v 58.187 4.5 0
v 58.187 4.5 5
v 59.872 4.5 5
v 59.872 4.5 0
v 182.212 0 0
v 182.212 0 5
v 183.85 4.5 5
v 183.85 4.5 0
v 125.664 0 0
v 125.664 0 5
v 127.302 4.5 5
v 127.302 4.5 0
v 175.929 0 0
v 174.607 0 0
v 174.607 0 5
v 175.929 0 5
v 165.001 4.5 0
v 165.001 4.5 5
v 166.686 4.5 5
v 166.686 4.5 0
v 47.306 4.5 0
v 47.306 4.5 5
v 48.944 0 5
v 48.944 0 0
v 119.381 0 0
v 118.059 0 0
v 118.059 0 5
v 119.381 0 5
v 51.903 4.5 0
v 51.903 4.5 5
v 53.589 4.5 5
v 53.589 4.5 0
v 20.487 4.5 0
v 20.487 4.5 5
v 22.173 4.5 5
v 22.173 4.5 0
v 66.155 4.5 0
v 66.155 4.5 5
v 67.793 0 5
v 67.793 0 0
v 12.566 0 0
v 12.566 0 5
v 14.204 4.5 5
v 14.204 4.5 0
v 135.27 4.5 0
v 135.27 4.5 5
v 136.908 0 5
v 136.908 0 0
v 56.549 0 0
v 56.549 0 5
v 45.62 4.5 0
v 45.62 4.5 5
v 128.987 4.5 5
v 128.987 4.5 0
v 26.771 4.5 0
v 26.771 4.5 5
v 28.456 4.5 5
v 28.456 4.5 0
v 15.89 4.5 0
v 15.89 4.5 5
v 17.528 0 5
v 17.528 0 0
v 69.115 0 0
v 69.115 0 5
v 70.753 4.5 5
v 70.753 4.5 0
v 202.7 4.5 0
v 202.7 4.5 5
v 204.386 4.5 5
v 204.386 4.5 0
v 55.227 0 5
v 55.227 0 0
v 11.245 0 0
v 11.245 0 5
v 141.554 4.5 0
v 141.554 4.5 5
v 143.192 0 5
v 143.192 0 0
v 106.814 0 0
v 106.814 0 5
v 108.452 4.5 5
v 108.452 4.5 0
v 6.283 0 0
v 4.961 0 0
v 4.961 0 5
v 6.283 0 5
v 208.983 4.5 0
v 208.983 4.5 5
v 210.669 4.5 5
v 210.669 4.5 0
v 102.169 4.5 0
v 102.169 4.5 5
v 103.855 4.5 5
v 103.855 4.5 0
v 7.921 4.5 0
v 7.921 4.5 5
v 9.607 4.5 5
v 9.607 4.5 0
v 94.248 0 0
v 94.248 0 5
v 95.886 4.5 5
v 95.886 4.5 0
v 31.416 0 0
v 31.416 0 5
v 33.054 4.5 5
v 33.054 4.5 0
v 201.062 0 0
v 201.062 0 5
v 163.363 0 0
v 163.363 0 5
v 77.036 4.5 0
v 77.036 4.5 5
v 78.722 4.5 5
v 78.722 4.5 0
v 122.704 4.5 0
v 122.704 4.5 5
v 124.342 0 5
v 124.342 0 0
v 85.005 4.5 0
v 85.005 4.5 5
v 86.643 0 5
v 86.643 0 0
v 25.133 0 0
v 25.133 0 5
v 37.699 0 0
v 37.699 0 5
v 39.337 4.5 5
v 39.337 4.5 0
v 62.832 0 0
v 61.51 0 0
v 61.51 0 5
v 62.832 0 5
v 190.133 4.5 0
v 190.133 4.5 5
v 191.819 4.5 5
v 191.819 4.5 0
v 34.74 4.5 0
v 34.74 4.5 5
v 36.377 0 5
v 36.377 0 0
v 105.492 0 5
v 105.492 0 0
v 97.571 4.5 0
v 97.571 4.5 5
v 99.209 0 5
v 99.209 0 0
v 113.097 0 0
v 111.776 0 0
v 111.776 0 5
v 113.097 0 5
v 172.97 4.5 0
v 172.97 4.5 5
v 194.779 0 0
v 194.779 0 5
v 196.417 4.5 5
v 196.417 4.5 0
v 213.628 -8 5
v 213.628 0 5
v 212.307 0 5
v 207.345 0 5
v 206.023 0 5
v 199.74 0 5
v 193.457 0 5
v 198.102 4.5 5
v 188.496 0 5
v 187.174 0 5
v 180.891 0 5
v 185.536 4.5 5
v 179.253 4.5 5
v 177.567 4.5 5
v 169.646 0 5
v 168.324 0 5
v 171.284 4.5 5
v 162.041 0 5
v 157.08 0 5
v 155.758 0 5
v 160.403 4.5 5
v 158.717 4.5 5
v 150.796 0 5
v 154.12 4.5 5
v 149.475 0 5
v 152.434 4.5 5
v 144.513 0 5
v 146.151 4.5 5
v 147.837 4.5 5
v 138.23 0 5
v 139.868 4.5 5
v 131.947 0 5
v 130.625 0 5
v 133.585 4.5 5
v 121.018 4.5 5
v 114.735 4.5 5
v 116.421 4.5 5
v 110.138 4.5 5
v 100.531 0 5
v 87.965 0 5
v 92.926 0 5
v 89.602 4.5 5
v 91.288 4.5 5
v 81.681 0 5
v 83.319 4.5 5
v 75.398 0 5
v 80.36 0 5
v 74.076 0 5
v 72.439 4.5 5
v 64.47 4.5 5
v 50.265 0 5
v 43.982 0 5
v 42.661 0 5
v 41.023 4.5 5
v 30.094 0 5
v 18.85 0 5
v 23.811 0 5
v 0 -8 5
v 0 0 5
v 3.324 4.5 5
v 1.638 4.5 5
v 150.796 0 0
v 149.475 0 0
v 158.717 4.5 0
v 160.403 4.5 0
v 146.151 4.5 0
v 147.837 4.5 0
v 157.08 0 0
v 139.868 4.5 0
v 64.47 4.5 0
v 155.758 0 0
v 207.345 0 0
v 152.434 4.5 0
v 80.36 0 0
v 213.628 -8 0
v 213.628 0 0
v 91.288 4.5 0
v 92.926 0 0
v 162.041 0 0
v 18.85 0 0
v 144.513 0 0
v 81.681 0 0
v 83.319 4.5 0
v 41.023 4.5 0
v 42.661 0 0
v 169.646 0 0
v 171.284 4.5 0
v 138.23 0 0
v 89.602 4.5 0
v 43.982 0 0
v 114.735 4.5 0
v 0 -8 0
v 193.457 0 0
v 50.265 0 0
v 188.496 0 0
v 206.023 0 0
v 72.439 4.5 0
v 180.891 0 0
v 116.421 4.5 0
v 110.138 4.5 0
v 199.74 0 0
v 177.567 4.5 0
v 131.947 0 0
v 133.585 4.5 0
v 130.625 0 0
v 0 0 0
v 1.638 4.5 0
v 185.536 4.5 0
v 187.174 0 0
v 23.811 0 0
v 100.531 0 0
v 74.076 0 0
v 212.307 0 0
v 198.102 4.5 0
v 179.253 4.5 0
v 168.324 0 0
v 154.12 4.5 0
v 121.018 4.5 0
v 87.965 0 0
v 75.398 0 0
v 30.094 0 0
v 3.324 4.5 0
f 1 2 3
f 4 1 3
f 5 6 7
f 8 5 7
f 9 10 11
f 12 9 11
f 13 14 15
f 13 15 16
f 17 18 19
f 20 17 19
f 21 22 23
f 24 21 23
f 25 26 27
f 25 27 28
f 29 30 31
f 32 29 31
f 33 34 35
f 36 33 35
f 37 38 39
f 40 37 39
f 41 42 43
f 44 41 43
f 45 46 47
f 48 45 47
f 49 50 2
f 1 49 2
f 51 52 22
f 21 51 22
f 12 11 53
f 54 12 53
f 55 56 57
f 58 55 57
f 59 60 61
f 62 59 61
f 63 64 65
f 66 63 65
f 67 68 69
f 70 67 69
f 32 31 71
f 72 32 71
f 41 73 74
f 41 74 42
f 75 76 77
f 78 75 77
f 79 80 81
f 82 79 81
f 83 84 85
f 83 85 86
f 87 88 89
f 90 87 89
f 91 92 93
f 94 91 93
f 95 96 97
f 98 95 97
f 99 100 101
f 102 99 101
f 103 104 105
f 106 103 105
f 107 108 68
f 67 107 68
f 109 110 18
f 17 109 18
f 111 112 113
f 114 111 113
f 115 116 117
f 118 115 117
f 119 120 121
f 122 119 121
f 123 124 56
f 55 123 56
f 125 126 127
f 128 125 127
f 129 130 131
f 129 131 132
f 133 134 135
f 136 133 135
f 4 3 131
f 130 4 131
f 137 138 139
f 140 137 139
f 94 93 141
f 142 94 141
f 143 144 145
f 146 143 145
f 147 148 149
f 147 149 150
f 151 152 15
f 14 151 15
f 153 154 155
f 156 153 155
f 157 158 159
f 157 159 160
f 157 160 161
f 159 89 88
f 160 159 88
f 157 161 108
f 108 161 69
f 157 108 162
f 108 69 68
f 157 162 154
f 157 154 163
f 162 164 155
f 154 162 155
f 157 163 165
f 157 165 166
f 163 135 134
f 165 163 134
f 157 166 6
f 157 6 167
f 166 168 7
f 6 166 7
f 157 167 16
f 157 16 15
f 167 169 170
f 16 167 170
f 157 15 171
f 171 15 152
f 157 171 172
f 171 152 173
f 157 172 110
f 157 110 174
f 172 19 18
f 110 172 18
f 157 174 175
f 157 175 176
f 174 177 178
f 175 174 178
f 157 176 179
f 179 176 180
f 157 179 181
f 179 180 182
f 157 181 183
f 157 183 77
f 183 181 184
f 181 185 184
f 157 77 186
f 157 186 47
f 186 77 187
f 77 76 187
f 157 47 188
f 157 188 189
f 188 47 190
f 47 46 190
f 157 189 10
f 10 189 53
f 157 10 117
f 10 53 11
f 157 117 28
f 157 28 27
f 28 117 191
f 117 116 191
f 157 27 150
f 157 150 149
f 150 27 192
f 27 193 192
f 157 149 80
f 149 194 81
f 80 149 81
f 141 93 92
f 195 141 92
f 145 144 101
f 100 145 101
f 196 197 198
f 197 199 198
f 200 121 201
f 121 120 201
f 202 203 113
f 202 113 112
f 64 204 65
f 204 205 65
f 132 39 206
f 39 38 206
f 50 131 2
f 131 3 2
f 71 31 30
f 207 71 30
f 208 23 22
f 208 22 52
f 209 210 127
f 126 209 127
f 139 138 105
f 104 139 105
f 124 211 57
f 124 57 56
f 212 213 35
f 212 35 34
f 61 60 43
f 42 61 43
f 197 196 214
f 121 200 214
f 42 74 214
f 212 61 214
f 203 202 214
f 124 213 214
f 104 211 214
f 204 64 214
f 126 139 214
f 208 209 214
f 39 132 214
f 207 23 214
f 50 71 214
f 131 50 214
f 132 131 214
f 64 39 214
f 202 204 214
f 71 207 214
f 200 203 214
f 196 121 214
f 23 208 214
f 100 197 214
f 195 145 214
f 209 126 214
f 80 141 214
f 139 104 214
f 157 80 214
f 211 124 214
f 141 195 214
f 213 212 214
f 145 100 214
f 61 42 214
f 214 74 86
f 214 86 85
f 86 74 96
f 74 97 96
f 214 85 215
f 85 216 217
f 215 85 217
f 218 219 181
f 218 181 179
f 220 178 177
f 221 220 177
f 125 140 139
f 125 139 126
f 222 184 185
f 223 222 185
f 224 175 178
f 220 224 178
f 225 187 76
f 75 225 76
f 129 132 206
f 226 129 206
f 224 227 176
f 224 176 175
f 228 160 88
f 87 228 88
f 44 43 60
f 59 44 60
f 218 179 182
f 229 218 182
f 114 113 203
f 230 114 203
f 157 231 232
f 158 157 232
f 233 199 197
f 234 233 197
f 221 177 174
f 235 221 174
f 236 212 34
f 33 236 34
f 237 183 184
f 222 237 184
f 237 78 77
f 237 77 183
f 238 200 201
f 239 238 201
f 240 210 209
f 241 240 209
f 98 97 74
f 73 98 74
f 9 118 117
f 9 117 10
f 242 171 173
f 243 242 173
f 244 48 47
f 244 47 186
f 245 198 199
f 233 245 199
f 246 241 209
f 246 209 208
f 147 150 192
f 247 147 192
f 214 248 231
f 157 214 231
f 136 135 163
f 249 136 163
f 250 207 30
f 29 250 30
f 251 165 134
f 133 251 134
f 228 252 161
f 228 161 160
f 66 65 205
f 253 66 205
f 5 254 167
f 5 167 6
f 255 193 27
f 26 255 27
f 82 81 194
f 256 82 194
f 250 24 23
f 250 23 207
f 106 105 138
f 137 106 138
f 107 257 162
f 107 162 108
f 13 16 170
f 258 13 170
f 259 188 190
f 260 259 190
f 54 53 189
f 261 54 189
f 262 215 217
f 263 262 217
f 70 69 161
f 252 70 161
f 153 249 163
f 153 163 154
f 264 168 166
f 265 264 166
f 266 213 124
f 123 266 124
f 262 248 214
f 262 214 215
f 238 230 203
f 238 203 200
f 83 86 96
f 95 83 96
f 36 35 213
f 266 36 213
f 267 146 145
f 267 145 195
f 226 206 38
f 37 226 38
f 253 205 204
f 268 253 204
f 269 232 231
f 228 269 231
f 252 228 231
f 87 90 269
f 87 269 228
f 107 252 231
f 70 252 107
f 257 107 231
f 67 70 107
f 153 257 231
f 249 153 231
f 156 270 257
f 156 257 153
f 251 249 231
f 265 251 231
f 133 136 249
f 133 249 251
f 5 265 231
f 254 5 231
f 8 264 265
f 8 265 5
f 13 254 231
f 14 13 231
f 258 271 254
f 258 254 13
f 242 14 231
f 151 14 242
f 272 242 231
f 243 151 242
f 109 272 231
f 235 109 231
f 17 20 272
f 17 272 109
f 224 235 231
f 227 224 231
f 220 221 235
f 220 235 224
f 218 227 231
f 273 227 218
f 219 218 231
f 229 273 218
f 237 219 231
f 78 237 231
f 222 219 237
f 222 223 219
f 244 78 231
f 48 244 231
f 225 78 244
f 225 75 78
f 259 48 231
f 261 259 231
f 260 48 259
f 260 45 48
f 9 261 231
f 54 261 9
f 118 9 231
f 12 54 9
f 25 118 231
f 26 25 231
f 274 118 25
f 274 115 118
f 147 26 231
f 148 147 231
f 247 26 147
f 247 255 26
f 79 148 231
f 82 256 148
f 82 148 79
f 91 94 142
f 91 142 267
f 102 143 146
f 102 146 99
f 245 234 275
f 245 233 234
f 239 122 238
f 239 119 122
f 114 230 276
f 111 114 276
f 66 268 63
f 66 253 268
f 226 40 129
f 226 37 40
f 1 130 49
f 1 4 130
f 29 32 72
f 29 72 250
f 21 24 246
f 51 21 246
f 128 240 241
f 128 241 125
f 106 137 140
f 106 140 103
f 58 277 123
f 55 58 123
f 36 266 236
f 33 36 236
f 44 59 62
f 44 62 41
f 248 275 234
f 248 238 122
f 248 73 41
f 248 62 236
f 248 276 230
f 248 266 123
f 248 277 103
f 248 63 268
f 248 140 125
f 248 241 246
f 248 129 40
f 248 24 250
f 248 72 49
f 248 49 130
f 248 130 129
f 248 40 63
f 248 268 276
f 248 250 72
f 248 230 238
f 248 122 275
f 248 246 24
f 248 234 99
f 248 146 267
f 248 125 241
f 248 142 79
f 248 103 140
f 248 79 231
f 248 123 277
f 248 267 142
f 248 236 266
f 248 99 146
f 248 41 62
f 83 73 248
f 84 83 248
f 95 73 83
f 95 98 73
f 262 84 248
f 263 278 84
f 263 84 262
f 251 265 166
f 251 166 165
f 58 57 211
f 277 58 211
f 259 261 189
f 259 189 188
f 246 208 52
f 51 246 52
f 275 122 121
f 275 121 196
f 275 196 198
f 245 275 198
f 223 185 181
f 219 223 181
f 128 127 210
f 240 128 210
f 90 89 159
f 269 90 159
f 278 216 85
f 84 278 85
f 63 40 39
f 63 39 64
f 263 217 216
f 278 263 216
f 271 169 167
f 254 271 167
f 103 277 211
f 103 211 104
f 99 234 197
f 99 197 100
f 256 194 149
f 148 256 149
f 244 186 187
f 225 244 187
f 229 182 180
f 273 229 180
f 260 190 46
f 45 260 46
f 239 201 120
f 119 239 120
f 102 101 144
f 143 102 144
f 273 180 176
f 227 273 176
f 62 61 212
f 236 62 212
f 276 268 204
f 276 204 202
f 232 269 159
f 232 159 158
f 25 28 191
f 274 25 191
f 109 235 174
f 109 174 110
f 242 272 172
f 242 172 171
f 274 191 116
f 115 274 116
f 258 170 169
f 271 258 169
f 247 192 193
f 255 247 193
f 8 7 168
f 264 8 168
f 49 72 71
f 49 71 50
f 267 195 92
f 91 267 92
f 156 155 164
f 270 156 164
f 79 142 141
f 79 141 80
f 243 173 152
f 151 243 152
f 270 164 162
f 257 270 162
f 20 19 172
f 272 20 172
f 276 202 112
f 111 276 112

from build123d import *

# Parameters (mm, degrees)
SKETCH1_W       = 213.628300444
SKETCH1_H       = 8
EXTRUDE1_DEPTH  = 5
EXTRUDE2_DEPTH  = 5
LPATTERN1_COUNT = 34
LPATTERN1_PITCH = 6.283185307


with BuildPart() as part:
    # Sketch1 → Extrude1 (new body)
    with BuildSketch(Plane.XY):
        with Locations((106.814150222, -4)):
            Rectangle(SKETCH1_W, SKETCH1_H)
    extrude(amount=EXTRUDE1_DEPTH)

    # Sketch2 → Extrude2 (add)
    with BuildSketch(Plane.XY.offset(5)):
        Polygon((0, 0), (1.637866054, 4.5), (3.323577771, 4.5), (4.961443825, 0), align=None)
    extrude2 = extrude(amount=-EXTRUDE2_DEPTH)

    # LPattern1: Extrude2 ×34
    with Locations(*[(i * LPATTERN1_PITCH, 0, 0) for i in range(1, LPATTERN1_COUNT)]):
        add(extrude2)


solid = part.part
